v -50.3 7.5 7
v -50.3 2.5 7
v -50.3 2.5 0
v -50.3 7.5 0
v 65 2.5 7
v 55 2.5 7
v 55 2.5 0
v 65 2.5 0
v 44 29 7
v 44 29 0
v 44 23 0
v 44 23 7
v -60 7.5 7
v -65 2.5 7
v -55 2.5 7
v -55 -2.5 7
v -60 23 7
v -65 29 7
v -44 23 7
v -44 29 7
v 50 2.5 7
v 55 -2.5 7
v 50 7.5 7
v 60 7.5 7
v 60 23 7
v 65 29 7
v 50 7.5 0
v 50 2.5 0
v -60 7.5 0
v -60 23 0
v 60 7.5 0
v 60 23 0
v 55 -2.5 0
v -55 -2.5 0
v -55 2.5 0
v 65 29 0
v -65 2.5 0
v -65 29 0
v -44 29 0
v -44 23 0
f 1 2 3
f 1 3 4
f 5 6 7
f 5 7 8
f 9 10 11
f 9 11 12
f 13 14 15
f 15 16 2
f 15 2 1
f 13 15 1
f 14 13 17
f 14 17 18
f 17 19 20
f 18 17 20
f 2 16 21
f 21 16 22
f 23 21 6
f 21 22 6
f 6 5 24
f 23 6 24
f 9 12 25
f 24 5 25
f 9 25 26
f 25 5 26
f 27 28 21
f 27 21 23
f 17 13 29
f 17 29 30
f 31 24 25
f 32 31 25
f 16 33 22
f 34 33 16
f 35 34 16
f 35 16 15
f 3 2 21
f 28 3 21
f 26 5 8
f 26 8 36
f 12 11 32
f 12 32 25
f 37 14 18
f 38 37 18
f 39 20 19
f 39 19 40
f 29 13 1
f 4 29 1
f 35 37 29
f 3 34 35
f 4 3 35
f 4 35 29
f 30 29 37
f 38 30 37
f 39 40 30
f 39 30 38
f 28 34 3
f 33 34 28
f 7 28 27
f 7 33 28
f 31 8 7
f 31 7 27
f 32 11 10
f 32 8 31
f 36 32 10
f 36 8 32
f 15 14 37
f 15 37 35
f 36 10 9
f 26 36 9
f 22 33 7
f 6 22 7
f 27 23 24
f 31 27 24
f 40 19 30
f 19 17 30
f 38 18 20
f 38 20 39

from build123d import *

# Parameters (mm, degrees)
SKETCH_1_W          = 100
SKETCH_1_H          = 5
EXTRUDE_1_DEPTH     = 8.8
SKETCH_2_W          = 5
SKETCH_2_H          = 10
EXTRUDE_2_DEPTH     = 8.8
SKETCH_3_W          = 5
SKETCH_3_H          = 10
EXTRUDE_3_DEPTH     = 8.8
SKETCH_4_W          = 5
SKETCH_4_H          = 5
EXTRUDE_4_DEPTH     = 8.8
SKETCH_5_W          = 5
SKETCH_5_H          = 5
EXTRUDE_5_DEPTH     = 8.8
SKETCH_6_W          = 0.3
SKETCH_6_H          = 5
CUT_EXTRUDE_1_DEPTH = 8.8
SKETCH_7_W          = 5
SKETCH_7_H          = 20.5
EXTRUDE_6_DEPTH     = 8.8
SKETCH_8_W          = 5
SKETCH_8_H          = 20.5
EXTRUDE_7_DEPTH     = 8.8
SKETCH_9_W          = 15
SKETCH_9_H          = 6
EXTRUDE_8_DEPTH     = 8.8
SKETCH_10_W         = 15
SKETCH_10_H         = 6
EXTRUDE_9_DEPTH     = 8.8
SKETCH_11_W         = 1.5
SKETCH_11_H         = 1.5
EXTRUDE_10_DEPTH    = 8.8
SKETCH_12_W         = 1.5
SKETCH_12_H         = 1.5
EXTRUDE_11_DEPTH    = 8.8
CUT_EXTRUDE_2_DEPTH = 1.8
SKETCH_15_W         = 1.5
SKETCH_15_H         = 1.5
CUT_EXTRUDE_3_DEPTH = 10
SKETCH_16_W         = 1.5
SKETCH_16_H         = 1.5
CUT_EXTRUDE_4_DEPTH = 10
SKETCH_17_W         = 7
SKETCH_17_H         = 6
EXTRUDE_12_DEPTH    = 5
SKETCH_18_W         = 7
SKETCH_18_H         = 6
EXTRUDE_13_DEPTH    = 5
SKETCH_19_W         = 7
SKETCH_19_H         = 6
EXTRUDE_14_DEPTH    = 1
SKETCH_20_W         = 7
SKETCH_20_H         = 6
EXTRUDE_15_DEPTH    = 1


with BuildPart() as part:
    # 草图1 → 凸台-拉伸1 (new body)
    with BuildSketch(Plane.XY):
        Rectangle(SKETCH_1_W, SKETCH_1_H)
    extrude(amount=EXTRUDE_1_DEPTH)

    # 草图2 → 凸台-拉伸2 (add)
    with BuildSketch(Plane(origin=(0, 0, 0), x_dir=(-1, 0, 0), z_dir=(0, 0, -1))):
        with Locations((-52.5, 2.5)):
            Rectangle(SKETCH_2_W, SKETCH_2_H)
    extrude(amount=-EXTRUDE_2_DEPTH)

    # 草图3 → 凸台-拉伸3 (add)
    with BuildSketch(Plane(origin=(0, 0, 0), x_dir=(-1, 0, 0), z_dir=(0, 0, -1))):
        with Locations((52.5, 2.5)):
            Rectangle(SKETCH_3_W, SKETCH_3_H)
    extrude(amount=-EXTRUDE_3_DEPTH)

    # 草图4 → 凸台-拉伸4 (add)
    with BuildSketch(Plane.XY.offset(8.8)):
        with Locations((-57.5, 5)):
            Rectangle(SKETCH_4_W, SKETCH_4_H)
    extrude(amount=-EXTRUDE_4_DEPTH)

    # 草图5 → 凸台-拉伸5 (add)
    with BuildSketch(Plane.XY.offset(8.8)):
        with Locations((57.5, 5)):
            Rectangle(SKETCH_5_W, SKETCH_5_H)
    extrude(amount=-EXTRUDE_5_DEPTH)

    # 草图6 → 切除-拉伸1 (cut)
    with BuildSketch(Plane.XY.offset(8.8)):
        with Locations((-50.15, 5)):
            Rectangle(SKETCH_6_W, SKETCH_6_H)
    extrude(amount=-CUT_EXTRUDE_1_DEPTH, mode=Mode.SUBTRACT)

    # 草图7 → 凸台-拉伸6 (add)
    with BuildSketch(Plane.XY.offset(8.8)):
        with Locations((-62.5, 12.75)):
            Rectangle(SKETCH_7_W, SKETCH_7_H)
    extrude(amount=-EXTRUDE_6_DEPTH)

    # 草图8 → 凸台-拉伸7 (add)
    with BuildSketch(Plane.XY.offset(8.8)):
        with Locations((62.5, 12.75)):
            Rectangle(SKETCH_8_W, SKETCH_8_H)
    extrude(amount=-EXTRUDE_7_DEPTH)

    # 草图9 → 凸台-拉伸8 (add)
    with BuildSketch(Plane.XY.offset(8.8)):
        with Locations((-57.5, 26)):
            Rectangle(SKETCH_9_W, SKETCH_9_H)
    extrude(amount=-EXTRUDE_8_DEPTH)

    # 草图10 → 凸台-拉伸9 (add)
    with BuildSketch(Plane.XY.offset(8.8)):
        with Locations((57.5, 26)):
            Rectangle(SKETCH_10_W, SKETCH_10_H)
    extrude(amount=-EXTRUDE_9_DEPTH)

    # 草图11 → 凸台-拉伸10 (add)
    with BuildSketch(Plane.XY.offset(8.8)):
        with Locations((-50.75, 22.25)):
            Rectangle(SKETCH_11_W, SKETCH_11_H)
    extrude(amount=-EXTRUDE_10_DEPTH)

    # 草图12 → 凸台-拉伸11 (add)
    with BuildSketch(Plane.XY.offset(8.8)):
        with Locations((50.75, 22.25)):
            Rectangle(SKETCH_12_W, SKETCH_12_H)
    extrude(amount=-EXTRUDE_11_DEPTH)

    # 草图14 → 切除-拉伸2 (cut)
    with BuildSketch(Plane.XY.offset(8.8)):
        Polygon((-51.5, 23), (-51.5, 21.5), (-50, 21.5), (-50, 29), (-65, 29), (-65, 2.5), (-55, 2.5), (-55, -2.5), (55, -2.5), (55, 2.5), (65, 2.5), (65, 29), (50, 29), (50, 21.5), (51.5, 21.5), (51.5, 23), (60, 23), (60, 7.5), (50, 7.5), (50, 2.5), (-50.3, 2.5), (-50.3, 7.5), (-60, 7.5), (-60, 23), align=None)
    extrude(amount=-CUT_EXTRUDE_2_DEPTH, mode=Mode.SUBTRACT)

    # 草图15 → 切除-拉伸3 (cut)
    with BuildSketch(Plane.XY.offset(7)):
        with Locations((-50.75, 22.25)):
            Rectangle(SKETCH_15_W, SKETCH_15_H)
    extrude(amount=-CUT_EXTRUDE_3_DEPTH, mode=Mode.SUBTRACT)

    # 草图16 → 切除-拉伸4 (cut)
    with BuildSketch(Plane.XY.offset(7)):
        with Locations((50.75, 22.25)):
            Rectangle(SKETCH_16_W, SKETCH_16_H)
    extrude(amount=-CUT_EXTRUDE_4_DEPTH, mode=Mode.SUBTRACT)

    # 草图17 → 凸台-拉伸12 (add)
    with BuildSketch(Plane(origin=(-50, 0, 0), x_dir=(0, 0, -1), z_dir=(1, 0, 0))):
        with Locations((-3.5, 26)):
            Rectangle(SKETCH_17_W, SKETCH_17_H)
    extrude(amount=EXTRUDE_12_DEPTH)

    # 草图18 → 凸台-拉伸13 (add)
    with BuildSketch(Plane.ZY.offset(-50)):
        with Locations((3.5, 26)):
            Rectangle(SKETCH_18_W, SKETCH_18_H)
    extrude(amount=EXTRUDE_13_DEPTH)

    # 草图19 → 凸台-拉伸14 (add)
    with BuildSketch(Plane(origin=(-45, 0, 0), x_dir=(0, 0, -1), z_dir=(1, 0, 0))):
        with Locations((-3.5, 26)):
            Rectangle(SKETCH_19_W, SKETCH_19_H)
    extrude(amount=EXTRUDE_14_DEPTH)

    # 草图20 → 凸台-拉伸15 (add)
    with BuildSketch(Plane.ZY.offset(-45)):
        with Locations((3.5, 26)):
            Rectangle(SKETCH_20_W, SKETCH_20_H)
    extrude(amount=EXTRUDE_15_DEPTH)


solid = part.part
